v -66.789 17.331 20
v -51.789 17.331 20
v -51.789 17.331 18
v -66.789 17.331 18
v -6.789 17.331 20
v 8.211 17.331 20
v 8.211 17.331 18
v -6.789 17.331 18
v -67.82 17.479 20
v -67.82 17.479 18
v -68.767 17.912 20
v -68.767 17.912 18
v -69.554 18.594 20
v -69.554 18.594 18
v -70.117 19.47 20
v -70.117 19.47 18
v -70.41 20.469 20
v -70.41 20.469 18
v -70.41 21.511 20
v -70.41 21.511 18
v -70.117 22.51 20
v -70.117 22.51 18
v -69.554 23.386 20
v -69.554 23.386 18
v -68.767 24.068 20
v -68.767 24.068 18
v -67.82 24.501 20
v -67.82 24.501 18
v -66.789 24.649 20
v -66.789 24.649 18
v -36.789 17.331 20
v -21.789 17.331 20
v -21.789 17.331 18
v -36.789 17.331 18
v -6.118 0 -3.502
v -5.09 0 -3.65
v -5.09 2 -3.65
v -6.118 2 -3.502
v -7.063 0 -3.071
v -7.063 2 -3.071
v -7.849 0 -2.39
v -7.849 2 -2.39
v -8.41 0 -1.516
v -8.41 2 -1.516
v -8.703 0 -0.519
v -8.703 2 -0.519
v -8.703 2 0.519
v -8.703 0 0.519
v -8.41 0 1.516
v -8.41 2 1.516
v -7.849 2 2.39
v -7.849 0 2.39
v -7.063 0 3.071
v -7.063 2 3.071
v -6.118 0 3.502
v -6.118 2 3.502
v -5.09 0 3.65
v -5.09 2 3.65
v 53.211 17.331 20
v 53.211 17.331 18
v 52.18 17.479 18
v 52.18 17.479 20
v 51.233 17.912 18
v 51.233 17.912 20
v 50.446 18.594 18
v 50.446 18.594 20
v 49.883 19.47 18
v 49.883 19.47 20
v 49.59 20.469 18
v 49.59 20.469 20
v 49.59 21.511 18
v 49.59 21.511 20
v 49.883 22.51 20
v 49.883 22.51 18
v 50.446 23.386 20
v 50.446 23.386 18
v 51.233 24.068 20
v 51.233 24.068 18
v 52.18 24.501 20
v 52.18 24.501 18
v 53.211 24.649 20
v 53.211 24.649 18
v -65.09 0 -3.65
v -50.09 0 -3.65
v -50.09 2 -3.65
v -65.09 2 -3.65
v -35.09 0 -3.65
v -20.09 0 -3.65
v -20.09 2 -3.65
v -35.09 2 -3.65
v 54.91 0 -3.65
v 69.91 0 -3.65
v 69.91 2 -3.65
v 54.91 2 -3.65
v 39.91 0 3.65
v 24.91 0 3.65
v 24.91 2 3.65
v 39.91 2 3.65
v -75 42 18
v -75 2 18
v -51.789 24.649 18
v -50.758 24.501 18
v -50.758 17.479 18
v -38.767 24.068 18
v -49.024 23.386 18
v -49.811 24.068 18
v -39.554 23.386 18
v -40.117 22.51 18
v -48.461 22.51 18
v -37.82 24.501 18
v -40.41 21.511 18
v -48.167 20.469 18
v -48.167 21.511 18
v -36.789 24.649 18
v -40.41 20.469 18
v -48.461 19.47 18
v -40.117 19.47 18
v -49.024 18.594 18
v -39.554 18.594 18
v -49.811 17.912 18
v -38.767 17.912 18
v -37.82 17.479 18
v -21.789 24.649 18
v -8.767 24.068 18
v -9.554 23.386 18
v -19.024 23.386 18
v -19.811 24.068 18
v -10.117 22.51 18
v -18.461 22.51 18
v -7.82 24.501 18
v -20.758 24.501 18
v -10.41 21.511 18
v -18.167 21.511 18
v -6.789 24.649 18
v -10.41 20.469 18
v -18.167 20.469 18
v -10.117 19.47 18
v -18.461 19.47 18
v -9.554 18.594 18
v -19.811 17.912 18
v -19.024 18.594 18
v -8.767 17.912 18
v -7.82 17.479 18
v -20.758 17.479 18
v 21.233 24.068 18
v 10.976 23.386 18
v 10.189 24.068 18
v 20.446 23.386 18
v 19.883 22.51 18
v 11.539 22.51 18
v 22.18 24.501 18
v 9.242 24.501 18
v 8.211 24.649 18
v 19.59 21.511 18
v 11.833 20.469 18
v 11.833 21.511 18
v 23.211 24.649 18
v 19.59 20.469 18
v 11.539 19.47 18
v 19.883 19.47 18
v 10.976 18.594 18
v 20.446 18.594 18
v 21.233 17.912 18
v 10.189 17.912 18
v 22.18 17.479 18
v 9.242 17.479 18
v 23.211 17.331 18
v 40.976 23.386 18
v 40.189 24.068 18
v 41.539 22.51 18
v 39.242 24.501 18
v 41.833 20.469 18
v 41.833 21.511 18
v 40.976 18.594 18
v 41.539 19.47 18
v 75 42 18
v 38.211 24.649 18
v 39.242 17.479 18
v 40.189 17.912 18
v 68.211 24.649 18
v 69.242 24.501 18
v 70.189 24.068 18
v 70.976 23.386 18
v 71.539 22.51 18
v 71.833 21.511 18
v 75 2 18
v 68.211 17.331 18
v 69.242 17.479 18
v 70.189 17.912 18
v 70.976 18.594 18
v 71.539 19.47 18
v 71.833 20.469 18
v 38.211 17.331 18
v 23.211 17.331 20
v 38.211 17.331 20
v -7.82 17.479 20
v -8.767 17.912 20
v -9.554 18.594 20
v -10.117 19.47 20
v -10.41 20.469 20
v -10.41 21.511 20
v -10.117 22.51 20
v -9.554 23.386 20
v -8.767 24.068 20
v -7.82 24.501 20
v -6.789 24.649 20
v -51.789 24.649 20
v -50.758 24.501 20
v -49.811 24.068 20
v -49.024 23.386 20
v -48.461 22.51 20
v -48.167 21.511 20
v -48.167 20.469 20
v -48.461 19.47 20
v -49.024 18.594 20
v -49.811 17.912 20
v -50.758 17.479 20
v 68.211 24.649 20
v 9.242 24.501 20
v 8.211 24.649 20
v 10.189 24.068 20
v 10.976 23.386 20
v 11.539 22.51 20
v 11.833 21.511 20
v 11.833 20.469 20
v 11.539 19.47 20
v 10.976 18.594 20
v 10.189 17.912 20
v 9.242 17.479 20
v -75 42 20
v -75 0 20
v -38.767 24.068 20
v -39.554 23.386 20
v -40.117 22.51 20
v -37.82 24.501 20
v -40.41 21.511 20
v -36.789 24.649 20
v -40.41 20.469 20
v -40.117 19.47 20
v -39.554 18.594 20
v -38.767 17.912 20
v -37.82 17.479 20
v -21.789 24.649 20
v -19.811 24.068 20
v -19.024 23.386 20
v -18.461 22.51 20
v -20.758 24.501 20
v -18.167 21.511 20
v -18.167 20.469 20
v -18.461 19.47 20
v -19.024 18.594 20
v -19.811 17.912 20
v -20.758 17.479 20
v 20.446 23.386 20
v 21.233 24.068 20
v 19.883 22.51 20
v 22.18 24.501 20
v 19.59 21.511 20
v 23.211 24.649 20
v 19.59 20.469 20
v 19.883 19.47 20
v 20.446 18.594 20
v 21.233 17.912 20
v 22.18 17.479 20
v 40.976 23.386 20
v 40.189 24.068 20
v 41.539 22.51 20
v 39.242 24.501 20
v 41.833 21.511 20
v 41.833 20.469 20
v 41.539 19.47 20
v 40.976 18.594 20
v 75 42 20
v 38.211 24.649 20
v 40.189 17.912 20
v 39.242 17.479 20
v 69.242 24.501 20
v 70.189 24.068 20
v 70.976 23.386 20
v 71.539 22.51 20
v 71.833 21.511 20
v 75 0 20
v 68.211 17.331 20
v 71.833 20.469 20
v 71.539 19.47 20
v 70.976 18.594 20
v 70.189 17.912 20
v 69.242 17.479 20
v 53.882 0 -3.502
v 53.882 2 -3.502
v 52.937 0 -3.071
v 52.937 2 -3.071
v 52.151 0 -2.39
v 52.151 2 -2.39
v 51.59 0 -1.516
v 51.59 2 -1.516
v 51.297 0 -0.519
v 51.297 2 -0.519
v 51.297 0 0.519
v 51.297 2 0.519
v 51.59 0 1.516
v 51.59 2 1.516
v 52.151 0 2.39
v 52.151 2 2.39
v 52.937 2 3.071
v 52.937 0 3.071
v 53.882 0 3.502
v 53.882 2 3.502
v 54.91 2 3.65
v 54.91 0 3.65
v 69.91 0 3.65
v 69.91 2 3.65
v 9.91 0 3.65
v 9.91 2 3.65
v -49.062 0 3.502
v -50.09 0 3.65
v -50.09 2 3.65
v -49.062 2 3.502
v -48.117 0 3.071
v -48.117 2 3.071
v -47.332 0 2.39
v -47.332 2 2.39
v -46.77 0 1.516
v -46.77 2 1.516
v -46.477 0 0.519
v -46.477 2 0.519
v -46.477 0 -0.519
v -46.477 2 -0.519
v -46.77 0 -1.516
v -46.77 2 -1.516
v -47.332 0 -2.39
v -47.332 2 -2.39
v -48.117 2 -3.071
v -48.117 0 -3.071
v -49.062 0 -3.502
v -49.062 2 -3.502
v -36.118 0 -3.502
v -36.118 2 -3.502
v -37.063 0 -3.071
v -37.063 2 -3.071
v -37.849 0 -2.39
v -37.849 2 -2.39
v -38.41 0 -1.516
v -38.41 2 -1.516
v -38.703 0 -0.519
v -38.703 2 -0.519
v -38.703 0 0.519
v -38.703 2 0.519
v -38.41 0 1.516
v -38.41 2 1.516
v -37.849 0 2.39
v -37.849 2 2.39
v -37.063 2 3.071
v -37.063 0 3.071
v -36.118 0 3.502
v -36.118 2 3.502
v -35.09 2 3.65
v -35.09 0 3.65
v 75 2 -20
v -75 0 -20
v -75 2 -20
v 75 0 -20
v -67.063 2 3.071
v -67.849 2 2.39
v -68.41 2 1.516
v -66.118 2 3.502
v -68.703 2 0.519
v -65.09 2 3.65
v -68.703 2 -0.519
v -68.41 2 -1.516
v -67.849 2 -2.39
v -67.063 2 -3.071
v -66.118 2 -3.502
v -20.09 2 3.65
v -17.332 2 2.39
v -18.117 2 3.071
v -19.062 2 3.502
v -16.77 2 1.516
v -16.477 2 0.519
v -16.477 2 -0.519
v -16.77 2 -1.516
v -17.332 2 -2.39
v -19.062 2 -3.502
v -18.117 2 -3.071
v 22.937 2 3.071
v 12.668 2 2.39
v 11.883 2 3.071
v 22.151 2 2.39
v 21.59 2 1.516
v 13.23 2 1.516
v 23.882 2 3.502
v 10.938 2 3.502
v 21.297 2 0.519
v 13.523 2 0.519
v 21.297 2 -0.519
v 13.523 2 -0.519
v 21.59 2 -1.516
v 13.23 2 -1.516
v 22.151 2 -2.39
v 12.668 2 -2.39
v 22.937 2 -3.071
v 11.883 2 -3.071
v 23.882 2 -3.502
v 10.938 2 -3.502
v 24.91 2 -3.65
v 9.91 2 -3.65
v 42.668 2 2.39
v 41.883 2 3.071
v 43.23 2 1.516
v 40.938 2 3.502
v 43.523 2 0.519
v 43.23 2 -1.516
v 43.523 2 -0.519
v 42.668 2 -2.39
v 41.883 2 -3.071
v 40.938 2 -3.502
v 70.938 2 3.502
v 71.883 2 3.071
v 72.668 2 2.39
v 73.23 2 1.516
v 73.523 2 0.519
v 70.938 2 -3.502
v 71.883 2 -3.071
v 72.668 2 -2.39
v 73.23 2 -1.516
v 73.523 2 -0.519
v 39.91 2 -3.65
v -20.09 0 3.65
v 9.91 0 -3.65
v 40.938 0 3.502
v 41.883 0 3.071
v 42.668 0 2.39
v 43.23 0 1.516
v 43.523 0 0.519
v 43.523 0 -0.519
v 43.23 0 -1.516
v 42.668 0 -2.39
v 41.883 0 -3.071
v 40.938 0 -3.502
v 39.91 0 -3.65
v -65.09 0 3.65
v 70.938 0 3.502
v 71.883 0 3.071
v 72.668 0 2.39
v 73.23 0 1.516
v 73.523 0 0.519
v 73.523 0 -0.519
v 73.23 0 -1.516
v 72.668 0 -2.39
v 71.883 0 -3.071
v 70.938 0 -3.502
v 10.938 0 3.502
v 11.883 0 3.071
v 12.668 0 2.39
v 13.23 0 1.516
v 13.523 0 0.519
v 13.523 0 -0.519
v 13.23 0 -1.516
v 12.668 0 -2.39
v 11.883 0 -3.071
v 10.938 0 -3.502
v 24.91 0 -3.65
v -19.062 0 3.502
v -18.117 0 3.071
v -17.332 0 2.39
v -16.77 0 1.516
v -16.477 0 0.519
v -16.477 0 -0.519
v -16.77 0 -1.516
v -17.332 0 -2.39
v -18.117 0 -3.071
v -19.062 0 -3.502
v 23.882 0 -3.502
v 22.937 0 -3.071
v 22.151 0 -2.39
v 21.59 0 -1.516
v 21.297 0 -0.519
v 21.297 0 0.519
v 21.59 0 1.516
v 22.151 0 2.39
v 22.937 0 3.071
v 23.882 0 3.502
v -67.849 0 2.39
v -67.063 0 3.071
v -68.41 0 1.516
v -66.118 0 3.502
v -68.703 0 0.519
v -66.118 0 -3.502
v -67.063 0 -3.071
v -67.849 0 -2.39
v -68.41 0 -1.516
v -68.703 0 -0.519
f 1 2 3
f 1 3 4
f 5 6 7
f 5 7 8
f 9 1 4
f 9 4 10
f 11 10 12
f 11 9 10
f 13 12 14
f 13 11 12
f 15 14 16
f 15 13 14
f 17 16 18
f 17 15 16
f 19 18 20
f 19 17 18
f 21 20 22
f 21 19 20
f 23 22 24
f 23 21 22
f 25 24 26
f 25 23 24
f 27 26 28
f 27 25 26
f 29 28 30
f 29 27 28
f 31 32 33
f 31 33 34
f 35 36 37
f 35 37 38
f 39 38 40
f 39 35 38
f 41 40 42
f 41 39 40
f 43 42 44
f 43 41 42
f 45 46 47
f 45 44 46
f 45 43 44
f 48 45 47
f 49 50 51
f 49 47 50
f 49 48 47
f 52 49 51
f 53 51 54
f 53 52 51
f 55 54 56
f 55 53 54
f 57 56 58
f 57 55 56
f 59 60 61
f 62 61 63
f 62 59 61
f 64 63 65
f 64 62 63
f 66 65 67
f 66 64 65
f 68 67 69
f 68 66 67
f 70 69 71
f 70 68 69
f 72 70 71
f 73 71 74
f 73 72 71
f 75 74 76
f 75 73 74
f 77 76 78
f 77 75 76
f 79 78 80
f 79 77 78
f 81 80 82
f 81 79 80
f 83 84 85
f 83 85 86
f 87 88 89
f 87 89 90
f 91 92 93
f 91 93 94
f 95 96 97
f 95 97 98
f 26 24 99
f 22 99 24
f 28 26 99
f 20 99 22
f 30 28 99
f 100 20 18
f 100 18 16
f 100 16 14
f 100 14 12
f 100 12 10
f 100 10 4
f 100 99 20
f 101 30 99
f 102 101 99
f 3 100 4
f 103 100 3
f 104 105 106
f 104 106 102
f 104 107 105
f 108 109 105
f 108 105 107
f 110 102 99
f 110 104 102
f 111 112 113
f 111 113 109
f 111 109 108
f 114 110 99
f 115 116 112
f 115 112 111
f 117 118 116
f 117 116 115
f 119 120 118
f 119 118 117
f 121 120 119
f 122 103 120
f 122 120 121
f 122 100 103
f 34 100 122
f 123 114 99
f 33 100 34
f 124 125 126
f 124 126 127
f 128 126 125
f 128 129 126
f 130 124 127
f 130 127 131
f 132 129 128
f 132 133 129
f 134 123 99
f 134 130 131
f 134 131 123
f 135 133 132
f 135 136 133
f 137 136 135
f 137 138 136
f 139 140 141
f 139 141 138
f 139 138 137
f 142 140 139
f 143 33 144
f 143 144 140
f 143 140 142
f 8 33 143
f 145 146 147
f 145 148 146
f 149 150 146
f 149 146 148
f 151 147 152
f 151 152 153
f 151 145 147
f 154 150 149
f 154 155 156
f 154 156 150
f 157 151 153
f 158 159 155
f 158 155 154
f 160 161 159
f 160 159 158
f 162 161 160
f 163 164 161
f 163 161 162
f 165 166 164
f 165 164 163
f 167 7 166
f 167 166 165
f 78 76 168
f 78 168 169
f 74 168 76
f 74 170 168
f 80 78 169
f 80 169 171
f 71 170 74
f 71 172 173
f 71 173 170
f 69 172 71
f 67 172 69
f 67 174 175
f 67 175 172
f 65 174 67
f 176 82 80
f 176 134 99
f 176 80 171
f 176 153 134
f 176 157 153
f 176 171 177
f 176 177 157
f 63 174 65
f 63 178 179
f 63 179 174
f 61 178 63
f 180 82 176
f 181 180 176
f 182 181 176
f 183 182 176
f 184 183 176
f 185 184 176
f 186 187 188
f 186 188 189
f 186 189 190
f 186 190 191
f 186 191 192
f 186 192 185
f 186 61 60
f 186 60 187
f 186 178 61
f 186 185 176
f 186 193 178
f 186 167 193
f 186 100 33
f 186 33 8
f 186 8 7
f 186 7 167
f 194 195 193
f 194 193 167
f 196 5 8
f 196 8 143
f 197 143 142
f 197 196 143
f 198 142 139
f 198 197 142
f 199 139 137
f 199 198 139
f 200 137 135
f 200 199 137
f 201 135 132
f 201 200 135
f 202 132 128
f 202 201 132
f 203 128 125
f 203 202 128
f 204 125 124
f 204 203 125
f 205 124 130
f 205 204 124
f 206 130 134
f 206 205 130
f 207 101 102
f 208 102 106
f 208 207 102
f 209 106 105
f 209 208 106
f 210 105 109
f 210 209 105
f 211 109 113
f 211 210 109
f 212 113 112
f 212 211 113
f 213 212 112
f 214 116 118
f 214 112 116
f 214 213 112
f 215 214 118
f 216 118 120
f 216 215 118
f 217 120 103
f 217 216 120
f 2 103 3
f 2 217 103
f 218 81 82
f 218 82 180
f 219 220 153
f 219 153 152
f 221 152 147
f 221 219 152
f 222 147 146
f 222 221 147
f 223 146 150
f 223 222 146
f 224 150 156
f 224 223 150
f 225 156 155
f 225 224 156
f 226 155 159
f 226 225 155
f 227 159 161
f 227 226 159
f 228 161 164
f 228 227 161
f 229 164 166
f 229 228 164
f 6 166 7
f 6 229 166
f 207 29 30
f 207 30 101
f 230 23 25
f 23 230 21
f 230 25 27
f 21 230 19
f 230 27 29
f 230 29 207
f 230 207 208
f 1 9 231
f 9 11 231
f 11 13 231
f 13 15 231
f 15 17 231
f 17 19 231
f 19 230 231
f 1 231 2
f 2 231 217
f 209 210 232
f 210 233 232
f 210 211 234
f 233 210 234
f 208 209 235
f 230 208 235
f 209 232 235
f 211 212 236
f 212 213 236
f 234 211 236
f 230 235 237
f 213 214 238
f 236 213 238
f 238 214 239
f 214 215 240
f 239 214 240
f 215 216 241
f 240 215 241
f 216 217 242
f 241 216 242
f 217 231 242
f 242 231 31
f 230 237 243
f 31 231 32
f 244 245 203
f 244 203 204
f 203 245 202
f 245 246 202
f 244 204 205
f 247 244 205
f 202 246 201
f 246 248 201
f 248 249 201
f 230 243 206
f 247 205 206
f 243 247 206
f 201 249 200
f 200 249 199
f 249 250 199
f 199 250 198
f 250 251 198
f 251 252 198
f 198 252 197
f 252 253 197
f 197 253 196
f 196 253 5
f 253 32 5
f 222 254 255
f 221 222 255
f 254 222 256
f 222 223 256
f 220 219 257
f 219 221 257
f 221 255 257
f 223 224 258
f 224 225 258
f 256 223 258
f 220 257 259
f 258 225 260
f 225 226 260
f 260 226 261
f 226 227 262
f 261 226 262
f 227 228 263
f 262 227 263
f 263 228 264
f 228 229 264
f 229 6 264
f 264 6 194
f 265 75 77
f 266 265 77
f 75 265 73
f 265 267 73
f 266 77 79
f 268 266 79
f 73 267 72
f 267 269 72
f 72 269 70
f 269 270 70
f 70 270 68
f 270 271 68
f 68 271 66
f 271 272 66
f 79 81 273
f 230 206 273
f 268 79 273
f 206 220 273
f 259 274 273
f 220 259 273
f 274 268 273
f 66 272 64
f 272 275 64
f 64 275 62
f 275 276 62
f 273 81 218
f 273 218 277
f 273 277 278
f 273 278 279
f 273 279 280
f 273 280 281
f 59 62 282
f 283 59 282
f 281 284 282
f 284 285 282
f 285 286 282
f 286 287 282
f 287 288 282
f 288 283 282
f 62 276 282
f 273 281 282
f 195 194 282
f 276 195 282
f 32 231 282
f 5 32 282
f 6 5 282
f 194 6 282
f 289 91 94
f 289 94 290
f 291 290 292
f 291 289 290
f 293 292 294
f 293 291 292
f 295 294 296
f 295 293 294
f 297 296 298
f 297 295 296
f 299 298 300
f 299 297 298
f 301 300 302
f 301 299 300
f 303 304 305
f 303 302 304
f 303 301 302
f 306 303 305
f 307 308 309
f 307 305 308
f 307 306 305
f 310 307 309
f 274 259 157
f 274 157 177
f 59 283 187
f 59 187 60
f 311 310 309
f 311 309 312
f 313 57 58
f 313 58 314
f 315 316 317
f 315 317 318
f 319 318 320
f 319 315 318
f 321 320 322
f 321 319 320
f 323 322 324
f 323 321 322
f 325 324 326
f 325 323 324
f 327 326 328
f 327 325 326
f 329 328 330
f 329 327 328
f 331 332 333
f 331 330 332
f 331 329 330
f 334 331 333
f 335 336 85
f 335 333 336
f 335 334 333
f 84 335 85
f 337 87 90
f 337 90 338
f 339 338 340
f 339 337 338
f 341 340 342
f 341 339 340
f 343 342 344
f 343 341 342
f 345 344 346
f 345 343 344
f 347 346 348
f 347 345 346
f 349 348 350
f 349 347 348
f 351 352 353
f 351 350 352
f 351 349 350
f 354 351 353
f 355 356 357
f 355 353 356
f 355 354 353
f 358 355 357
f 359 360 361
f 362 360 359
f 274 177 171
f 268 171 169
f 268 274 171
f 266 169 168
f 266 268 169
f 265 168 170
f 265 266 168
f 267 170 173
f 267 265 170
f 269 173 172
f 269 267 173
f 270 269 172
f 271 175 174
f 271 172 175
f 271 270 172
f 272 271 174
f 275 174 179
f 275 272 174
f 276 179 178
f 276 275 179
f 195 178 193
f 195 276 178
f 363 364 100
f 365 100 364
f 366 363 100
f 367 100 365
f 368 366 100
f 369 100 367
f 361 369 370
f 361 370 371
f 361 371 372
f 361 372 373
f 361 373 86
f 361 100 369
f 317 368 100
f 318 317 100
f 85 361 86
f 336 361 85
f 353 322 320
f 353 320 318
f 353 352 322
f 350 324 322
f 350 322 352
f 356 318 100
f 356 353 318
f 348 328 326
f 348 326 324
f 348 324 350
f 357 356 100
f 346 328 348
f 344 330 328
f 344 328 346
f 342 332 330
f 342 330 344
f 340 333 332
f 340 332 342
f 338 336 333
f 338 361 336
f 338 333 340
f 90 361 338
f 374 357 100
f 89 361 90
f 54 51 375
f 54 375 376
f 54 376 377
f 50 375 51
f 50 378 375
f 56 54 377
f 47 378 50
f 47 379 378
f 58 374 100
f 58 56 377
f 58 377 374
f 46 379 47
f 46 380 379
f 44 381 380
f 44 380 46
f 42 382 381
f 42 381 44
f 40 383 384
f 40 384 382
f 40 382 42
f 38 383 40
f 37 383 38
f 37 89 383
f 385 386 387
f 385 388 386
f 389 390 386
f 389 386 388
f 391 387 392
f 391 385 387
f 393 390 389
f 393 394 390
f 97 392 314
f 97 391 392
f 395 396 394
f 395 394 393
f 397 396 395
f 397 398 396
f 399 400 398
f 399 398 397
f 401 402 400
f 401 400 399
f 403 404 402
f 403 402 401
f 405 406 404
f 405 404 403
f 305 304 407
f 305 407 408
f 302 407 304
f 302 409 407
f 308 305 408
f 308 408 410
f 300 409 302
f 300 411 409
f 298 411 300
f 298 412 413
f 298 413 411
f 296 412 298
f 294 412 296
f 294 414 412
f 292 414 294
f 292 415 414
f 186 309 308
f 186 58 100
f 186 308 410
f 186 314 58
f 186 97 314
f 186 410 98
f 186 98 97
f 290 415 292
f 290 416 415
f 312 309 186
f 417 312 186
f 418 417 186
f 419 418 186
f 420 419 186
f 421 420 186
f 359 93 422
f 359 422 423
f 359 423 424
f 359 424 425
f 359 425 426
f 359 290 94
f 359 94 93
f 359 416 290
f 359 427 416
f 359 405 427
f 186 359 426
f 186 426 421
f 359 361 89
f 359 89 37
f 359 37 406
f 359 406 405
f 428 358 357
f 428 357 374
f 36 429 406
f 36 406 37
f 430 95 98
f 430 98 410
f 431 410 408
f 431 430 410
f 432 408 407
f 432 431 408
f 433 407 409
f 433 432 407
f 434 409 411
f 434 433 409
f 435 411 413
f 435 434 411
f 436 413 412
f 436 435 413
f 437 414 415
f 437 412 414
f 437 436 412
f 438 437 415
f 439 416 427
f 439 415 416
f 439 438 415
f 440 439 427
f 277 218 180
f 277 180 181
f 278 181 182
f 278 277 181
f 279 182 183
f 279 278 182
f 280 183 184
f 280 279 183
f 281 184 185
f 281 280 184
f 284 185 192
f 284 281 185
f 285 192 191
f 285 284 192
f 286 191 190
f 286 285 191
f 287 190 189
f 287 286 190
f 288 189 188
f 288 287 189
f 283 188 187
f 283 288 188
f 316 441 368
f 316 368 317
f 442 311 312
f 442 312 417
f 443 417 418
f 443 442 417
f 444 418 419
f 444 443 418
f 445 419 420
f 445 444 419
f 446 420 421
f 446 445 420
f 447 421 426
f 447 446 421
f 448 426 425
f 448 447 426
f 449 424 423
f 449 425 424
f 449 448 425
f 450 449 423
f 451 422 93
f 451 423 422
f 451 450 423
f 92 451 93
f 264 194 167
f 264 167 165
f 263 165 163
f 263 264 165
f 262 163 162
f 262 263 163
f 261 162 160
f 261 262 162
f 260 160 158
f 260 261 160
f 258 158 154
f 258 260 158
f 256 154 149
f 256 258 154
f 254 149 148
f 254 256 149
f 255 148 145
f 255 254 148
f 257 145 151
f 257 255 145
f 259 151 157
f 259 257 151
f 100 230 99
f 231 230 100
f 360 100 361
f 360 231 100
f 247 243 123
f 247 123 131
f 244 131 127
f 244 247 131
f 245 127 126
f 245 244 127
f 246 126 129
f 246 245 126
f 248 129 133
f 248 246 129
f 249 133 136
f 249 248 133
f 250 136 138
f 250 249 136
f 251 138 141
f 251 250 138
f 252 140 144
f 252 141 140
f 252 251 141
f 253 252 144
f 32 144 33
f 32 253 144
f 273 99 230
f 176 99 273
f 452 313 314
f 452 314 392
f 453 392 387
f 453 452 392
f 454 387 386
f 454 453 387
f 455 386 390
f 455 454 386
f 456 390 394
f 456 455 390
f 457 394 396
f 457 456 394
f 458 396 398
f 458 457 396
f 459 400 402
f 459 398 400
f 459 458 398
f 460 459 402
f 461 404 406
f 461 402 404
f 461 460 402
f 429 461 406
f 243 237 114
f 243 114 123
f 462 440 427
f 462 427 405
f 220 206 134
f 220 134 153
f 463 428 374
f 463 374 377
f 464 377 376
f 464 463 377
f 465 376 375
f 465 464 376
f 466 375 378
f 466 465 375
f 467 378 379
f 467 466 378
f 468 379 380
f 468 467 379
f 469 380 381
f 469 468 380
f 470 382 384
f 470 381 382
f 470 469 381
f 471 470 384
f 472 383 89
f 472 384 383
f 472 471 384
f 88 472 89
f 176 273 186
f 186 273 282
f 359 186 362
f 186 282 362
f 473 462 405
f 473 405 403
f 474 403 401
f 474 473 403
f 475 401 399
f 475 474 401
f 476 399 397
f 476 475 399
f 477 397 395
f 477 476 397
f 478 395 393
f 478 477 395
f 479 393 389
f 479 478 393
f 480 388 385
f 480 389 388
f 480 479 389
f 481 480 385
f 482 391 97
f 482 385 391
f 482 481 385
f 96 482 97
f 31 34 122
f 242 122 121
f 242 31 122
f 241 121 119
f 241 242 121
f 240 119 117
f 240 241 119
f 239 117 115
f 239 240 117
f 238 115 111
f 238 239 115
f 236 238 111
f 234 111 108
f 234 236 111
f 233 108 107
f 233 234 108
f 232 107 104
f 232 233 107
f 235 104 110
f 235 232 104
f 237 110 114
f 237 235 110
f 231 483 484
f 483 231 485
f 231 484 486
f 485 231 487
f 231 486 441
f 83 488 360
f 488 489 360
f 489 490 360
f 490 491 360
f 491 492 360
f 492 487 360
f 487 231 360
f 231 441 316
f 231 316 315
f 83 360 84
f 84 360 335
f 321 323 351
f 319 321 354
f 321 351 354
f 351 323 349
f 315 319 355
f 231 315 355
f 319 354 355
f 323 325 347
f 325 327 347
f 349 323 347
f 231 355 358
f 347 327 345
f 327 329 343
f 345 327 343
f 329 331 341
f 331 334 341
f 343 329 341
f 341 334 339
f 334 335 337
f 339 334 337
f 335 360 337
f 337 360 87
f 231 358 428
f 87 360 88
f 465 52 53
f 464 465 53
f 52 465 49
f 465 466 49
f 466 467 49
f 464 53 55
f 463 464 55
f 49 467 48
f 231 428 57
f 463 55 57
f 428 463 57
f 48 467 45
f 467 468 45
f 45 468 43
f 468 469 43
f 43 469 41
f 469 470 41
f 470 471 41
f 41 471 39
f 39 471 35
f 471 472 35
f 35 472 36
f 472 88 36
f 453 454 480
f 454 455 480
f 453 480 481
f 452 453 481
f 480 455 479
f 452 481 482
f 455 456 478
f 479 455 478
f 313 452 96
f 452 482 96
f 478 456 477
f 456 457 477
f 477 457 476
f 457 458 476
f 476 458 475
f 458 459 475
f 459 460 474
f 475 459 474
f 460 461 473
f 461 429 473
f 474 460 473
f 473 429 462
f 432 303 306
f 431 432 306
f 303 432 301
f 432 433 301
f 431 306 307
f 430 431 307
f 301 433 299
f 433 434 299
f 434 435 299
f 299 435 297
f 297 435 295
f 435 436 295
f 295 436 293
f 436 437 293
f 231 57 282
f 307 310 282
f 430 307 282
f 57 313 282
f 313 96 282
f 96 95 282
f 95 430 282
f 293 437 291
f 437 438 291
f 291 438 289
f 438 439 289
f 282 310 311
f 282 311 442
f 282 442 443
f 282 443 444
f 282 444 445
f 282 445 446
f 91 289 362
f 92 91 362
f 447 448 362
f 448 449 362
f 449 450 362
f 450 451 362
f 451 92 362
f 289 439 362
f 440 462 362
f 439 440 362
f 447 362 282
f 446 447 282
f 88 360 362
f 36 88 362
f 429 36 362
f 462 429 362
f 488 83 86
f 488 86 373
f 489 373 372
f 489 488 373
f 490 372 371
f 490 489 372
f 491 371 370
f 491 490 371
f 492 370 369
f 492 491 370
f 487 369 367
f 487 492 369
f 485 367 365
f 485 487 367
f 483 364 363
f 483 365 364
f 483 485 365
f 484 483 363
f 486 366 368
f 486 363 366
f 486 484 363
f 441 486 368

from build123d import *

# Parameters (mm, degrees)
SKETCH1_W           = 150
SKETCH1_H           = 40
BOSS_EXTRUDE1_DEPTH = 2
SKETCH2_W           = 150
SKETCH2_H           = 2
BOSS_EXTRUDE2_DEPTH = 40
CUT_EXTRUDE2_DEPTH  = 10
CUT_EXTRUDE4_DEPTH  = 10


with BuildPart() as part:
    # Sketch1 → Boss-Extrude1 (new body)
    with BuildSketch(Plane(origin=(0, 0, 0), x_dir=(1, 0, 0), z_dir=(0, 1, 0))):
        Rectangle(SKETCH1_W, SKETCH1_H)
    extrude(amount=BOSS_EXTRUDE1_DEPTH)

    # Sketch2 → Boss-Extrude2 (add)
    with BuildSketch(Plane(origin=(0, 2, 0), x_dir=(1, 0, 0), z_dir=(0, 1, 0))):
        with Locations((0, -19)):
            Rectangle(SKETCH2_W, SKETCH2_H)
    extrude(amount=BOSS_EXTRUDE2_DEPTH)

    # Sketch3 → Cut-Extrude2 (cut)
    with BuildSketch(Plane.XY.offset(20)):
        with BuildLine():
            Line((-36.788952994, 24.648821368), (-21.788952994, 24.648821368))
            ThreePointArc((-21.788952994, 24.648821368), (-18.13017777, 20.990046144), (-21.788952994, 17.33127092))
            Line((-21.788952994, 17.33127092), (-36.788952994, 17.33127092))
            ThreePointArc((-36.788952994, 17.33127092), (-40.447728218, 20.990046144), (-36.788952994, 24.648821368))
        make_face()
        with BuildLine():
            Line((-66.788952994, 24.648821368), (-51.788952994, 24.648821368))
            ThreePointArc((-51.788952994, 24.648821368), (-48.13017777, 20.990046144), (-51.788952994, 17.33127092))
            Line((-51.788952994, 17.33127092), (-66.788952994, 17.33127092))
            ThreePointArc((-66.788952994, 17.33127092), (-70.447728218, 20.990046144), (-66.788952994, 24.648821368))
        make_face()
        with BuildLine():
            Line((-6.788952994, 24.648821368), (8.211047006, 24.648821368))
            ThreePointArc((8.211047006, 24.648821368), (11.86982223, 20.990046144), (8.211047006, 17.33127092))
            Line((8.211047006, 17.33127092), (-6.788952994, 17.33127092))
            ThreePointArc((-6.788952994, 17.33127092), (-10.447728218, 20.990046144), (-6.788952994, 24.648821368))
        make_face()
        with BuildLine():
            Line((23.211047006, 24.648821368), (38.211047006, 24.648821368))
            ThreePointArc((38.211047006, 24.648821368), (41.86982223, 20.990046144), (38.211047006, 17.33127092))
            Line((38.211047006, 17.33127092), (23.211047006, 17.33127092))
            ThreePointArc((23.211047006, 17.33127092), (19.552271782, 20.990046144), (23.211047006, 24.648821368))
        make_face()
        with BuildLine():
            Line((53.211047006, 24.648821368), (68.211047006, 24.648821368))
            ThreePointArc((68.211047006, 24.648821368), (71.86982223, 20.990046144), (68.211047006, 17.33127092))
            Line((68.211047006, 17.33127092), (53.211047006, 17.33127092))
            ThreePointArc((53.211047006, 17.33127092), (49.552271782, 20.990046144), (53.211047006, 24.648821368))
        make_face()
    extrude(amount=-CUT_EXTRUDE2_DEPTH, mode=Mode.SUBTRACT)

    # Sketch4 → Cut-Extrude4 (cut)
    with BuildSketch(Plane.XZ):
        with BuildLine():
            Line((-35.090017562, 3.65), (-20.090017562, 3.65))
            ThreePointArc((-20.090017562, 3.65), (-16.440017562, 0), (-20.090017562, -3.65))
            Line((-20.090017562, -3.65), (-35.090017562, -3.65))
            ThreePointArc((-35.090017562, -3.65), (-38.740017562, 0), (-35.090017562, 3.65))
        make_face()
        with BuildLine():
            Line((-65.090017562, 3.65), (-50.090017562, 3.65))
            ThreePointArc((-50.090017562, 3.65), (-46.440017562, 0), (-50.090017562, -3.65))
            Line((-50.090017562, -3.65), (-65.090017562, -3.65))
            ThreePointArc((-65.090017562, -3.65), (-68.740017562, 0), (-65.090017562, 3.65))
        make_face()
        with BuildLine():
            Line((-5.090017562, 3.65), (9.909982438, 3.65))
            ThreePointArc((9.909982438, 3.65), (13.559982438, 0), (9.909982438, -3.65))
            Line((9.909982438, -3.65), (-5.090017562, -3.65))
            ThreePointArc((-5.090017562, -3.65), (-8.740017562, 0), (-5.090017562, 3.65))
        make_face()
        with BuildLine():
            Line((24.909982438, 3.65), (39.909982438, 3.65))
            ThreePointArc((39.909982438, 3.65), (43.559982438, 0), (39.909982438, -3.65))
            Line((39.909982438, -3.65), (24.909982438, -3.65))
            ThreePointArc((24.909982438, -3.65), (21.259982438, 0), (24.909982438, 3.65))
        make_face()
        with BuildLine():
            Line((54.909982438, 3.65), (69.909982438, 3.65))
            ThreePointArc((69.909982438, 3.65), (73.559982438, 0), (69.909982438, -3.65))
            Line((69.909982438, -3.65), (54.909982438, -3.65))
            ThreePointArc((54.909982438, -3.65), (51.259982438, 0), (54.909982438, 3.65))
        make_face()
    extrude(amount=-CUT_EXTRUDE4_DEPTH, mode=Mode.SUBTRACT)


solid = part.part
